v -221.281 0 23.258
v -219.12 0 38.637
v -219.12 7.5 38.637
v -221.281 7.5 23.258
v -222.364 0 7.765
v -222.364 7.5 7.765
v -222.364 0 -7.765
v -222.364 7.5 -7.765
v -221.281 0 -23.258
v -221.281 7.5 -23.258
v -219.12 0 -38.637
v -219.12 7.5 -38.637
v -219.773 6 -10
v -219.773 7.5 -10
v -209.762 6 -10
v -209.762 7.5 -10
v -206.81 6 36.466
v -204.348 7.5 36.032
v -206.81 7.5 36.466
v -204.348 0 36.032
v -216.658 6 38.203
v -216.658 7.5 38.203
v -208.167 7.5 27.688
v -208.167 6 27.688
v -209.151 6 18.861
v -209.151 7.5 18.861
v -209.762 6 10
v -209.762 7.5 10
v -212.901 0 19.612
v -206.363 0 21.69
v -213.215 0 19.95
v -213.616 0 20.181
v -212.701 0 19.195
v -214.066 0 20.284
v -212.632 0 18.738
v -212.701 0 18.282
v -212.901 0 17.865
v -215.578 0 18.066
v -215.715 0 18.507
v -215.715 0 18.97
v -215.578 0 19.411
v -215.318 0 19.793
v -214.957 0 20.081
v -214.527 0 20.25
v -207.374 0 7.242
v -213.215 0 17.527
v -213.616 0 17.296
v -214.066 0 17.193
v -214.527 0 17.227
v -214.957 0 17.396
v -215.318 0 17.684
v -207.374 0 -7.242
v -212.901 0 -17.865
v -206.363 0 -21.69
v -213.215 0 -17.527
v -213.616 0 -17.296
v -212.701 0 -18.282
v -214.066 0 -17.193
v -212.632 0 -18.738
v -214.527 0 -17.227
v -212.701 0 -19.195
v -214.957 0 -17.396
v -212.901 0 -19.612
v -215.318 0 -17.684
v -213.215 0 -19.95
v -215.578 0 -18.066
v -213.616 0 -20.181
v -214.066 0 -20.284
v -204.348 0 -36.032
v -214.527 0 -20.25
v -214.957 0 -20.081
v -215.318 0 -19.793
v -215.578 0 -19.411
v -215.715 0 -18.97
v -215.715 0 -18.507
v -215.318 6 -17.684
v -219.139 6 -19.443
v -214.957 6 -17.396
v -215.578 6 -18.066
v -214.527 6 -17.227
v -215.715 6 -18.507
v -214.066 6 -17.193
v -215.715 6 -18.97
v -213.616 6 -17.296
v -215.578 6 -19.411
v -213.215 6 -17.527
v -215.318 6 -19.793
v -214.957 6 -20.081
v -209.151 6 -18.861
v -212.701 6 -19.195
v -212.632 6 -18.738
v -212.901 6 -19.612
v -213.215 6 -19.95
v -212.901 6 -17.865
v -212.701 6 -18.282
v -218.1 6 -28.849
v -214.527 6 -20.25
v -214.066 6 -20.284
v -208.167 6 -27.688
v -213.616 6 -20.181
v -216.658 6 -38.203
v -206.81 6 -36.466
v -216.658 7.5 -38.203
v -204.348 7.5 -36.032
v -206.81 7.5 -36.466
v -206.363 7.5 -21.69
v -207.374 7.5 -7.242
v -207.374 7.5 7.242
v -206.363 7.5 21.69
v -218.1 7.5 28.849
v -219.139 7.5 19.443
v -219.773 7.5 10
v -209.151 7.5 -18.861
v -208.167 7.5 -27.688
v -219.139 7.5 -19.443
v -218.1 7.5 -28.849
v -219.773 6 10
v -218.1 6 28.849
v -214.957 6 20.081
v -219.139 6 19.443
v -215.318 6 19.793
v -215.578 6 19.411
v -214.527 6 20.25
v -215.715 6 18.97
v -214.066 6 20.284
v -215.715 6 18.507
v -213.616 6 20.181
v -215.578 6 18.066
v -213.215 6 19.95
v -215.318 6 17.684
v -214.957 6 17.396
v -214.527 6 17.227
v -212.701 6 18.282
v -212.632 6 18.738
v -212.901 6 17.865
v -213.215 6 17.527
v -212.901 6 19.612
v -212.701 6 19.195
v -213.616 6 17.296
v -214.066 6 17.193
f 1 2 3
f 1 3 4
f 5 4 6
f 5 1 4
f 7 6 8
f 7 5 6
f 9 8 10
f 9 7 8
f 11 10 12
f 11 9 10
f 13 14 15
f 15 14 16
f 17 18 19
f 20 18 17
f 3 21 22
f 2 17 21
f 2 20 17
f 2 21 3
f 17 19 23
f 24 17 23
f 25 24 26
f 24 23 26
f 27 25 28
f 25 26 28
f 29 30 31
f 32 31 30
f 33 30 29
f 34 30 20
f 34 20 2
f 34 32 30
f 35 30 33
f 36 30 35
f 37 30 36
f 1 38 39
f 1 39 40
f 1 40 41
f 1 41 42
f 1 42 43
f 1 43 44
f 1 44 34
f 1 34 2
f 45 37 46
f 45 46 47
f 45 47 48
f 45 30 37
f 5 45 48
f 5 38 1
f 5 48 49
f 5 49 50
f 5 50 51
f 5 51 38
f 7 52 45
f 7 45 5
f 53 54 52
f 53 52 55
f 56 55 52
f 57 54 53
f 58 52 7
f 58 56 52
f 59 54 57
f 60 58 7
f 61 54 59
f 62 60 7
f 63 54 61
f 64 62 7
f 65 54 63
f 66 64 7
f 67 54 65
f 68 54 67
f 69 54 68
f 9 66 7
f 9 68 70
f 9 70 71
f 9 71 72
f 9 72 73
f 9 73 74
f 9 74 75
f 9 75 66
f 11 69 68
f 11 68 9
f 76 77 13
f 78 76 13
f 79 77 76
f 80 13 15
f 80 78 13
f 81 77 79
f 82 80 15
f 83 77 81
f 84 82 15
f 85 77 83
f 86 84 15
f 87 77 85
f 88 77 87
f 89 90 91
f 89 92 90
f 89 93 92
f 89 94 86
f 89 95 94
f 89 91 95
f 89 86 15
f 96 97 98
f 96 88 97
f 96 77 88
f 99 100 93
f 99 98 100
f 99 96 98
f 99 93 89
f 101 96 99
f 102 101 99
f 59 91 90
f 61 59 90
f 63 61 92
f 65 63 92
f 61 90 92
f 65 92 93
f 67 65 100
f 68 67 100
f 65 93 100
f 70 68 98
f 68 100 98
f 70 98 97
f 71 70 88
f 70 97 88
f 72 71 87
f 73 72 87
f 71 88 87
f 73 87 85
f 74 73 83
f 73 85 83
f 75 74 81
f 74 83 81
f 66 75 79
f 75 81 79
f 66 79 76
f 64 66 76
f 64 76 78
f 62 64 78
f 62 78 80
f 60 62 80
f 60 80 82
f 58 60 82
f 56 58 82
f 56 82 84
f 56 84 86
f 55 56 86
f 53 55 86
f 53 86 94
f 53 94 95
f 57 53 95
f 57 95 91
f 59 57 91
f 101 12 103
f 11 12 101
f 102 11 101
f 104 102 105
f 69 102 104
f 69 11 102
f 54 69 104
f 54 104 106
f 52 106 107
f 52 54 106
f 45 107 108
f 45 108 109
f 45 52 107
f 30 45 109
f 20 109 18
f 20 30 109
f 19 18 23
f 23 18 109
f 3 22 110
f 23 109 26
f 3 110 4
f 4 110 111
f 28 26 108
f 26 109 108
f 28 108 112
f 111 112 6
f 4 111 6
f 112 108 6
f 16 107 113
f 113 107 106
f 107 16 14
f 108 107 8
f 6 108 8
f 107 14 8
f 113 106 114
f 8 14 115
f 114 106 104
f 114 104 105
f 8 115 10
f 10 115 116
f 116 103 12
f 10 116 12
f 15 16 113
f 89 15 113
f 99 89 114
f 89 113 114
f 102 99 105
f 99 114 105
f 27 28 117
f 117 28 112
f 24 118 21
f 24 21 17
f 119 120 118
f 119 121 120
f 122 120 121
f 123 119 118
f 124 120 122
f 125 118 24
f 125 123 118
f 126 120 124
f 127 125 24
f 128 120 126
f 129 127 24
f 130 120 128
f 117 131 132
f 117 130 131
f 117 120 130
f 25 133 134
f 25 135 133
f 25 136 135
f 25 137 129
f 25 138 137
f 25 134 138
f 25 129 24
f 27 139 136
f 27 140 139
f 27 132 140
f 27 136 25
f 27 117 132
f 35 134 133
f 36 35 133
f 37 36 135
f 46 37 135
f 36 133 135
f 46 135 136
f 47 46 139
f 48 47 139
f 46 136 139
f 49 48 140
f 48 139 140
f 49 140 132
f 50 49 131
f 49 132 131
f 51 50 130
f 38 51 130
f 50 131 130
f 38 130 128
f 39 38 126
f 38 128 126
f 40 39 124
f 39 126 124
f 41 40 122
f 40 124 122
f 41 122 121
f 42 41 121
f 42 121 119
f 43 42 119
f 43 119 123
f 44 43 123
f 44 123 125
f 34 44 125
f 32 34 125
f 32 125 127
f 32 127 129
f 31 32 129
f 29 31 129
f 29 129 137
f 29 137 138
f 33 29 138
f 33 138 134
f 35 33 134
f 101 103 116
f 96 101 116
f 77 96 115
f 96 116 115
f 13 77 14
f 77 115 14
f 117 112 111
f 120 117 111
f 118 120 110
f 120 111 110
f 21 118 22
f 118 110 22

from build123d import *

# Parameters (mm, degrees)
BOSS_EXTRUDE1_DEPTH        = 7.5
CUT_EXTRUDE1_DEPTH         = 1.5
F_3_1_3_1_DIAMETER_HOLE1_D = 3.1


with BuildPart() as part:
    # Sketch1 → Boss-Extrude1 (new body)
    with BuildSketch(Plane(origin=(0, 0, 0), x_dir=(1, 0, 0), z_dir=(0, 1, 0))):
        with BuildLine():
            Line((-219.119725045, 38.636719531), (-204.34760875, 36.031996866))
            ThreePointArc((-204.34760875, 36.031996866), (-207.5, 0), (-204.34760875, -36.031996866))
            Line((-204.34760875, -36.031996866), (-219.119725045, -38.636719531))
            ThreePointArc((-219.119725045, -38.636719531), (-222.5, 0), (-219.119725045, 38.636719531))
        make_face()
    extrude(amount=BOSS_EXTRUDE1_DEPTH)

    # Sketch2 → Cut-Extrude1 (cut)
    with BuildSketch(Plane(origin=(0, 7.5, 0), x_dir=(1, 0, 0), z_dir=(0, 1, 0))):
        with BuildLine():
            Line((-206.809628133, 36.46611731), (-216.657705663, 38.202599087))
            ThreePointArc((-216.657705663, 38.202599087), (-218.670303662, 24.151569236), (-219.772609758, 10))
            Line((-219.772609758, 10), (-209.761769634, 10))
            ThreePointArc((-209.761769634, 10), (-208.70564487, 23.279901188), (-206.809628133, 36.46611731))
        make_face()
        with BuildLine():
            Line((-209.761769634, -10), (-219.772609758, -10))
            ThreePointArc((-219.772609758, -10), (-218.670303662, -24.151569236), (-216.657705663, -38.202599087))
            Line((-216.657705663, -38.202599087), (-206.809628133, -36.46611731))
            ThreePointArc((-206.809628133, -36.46611731), (-208.70564487, -23.279901188), (-209.761769634, -10))
        make_face()
    extrude(amount=-CUT_EXTRUDE1_DEPTH, mode=Mode.SUBTRACT)

    # Ø3.1 (3.1) Diameter Hole1 (through all)
    with Locations(Plane(origin=(0, 0, 0), x_dir=(-1, 0, 0), z_dir=(0, -1, 0))):
        with Locations((214.18186009, -18.738484691), (214.18186009, 18.738484691)):
            Hole(F_3_1_3_1_DIAMETER_HOLE1_D / 2)


solid = part.part
